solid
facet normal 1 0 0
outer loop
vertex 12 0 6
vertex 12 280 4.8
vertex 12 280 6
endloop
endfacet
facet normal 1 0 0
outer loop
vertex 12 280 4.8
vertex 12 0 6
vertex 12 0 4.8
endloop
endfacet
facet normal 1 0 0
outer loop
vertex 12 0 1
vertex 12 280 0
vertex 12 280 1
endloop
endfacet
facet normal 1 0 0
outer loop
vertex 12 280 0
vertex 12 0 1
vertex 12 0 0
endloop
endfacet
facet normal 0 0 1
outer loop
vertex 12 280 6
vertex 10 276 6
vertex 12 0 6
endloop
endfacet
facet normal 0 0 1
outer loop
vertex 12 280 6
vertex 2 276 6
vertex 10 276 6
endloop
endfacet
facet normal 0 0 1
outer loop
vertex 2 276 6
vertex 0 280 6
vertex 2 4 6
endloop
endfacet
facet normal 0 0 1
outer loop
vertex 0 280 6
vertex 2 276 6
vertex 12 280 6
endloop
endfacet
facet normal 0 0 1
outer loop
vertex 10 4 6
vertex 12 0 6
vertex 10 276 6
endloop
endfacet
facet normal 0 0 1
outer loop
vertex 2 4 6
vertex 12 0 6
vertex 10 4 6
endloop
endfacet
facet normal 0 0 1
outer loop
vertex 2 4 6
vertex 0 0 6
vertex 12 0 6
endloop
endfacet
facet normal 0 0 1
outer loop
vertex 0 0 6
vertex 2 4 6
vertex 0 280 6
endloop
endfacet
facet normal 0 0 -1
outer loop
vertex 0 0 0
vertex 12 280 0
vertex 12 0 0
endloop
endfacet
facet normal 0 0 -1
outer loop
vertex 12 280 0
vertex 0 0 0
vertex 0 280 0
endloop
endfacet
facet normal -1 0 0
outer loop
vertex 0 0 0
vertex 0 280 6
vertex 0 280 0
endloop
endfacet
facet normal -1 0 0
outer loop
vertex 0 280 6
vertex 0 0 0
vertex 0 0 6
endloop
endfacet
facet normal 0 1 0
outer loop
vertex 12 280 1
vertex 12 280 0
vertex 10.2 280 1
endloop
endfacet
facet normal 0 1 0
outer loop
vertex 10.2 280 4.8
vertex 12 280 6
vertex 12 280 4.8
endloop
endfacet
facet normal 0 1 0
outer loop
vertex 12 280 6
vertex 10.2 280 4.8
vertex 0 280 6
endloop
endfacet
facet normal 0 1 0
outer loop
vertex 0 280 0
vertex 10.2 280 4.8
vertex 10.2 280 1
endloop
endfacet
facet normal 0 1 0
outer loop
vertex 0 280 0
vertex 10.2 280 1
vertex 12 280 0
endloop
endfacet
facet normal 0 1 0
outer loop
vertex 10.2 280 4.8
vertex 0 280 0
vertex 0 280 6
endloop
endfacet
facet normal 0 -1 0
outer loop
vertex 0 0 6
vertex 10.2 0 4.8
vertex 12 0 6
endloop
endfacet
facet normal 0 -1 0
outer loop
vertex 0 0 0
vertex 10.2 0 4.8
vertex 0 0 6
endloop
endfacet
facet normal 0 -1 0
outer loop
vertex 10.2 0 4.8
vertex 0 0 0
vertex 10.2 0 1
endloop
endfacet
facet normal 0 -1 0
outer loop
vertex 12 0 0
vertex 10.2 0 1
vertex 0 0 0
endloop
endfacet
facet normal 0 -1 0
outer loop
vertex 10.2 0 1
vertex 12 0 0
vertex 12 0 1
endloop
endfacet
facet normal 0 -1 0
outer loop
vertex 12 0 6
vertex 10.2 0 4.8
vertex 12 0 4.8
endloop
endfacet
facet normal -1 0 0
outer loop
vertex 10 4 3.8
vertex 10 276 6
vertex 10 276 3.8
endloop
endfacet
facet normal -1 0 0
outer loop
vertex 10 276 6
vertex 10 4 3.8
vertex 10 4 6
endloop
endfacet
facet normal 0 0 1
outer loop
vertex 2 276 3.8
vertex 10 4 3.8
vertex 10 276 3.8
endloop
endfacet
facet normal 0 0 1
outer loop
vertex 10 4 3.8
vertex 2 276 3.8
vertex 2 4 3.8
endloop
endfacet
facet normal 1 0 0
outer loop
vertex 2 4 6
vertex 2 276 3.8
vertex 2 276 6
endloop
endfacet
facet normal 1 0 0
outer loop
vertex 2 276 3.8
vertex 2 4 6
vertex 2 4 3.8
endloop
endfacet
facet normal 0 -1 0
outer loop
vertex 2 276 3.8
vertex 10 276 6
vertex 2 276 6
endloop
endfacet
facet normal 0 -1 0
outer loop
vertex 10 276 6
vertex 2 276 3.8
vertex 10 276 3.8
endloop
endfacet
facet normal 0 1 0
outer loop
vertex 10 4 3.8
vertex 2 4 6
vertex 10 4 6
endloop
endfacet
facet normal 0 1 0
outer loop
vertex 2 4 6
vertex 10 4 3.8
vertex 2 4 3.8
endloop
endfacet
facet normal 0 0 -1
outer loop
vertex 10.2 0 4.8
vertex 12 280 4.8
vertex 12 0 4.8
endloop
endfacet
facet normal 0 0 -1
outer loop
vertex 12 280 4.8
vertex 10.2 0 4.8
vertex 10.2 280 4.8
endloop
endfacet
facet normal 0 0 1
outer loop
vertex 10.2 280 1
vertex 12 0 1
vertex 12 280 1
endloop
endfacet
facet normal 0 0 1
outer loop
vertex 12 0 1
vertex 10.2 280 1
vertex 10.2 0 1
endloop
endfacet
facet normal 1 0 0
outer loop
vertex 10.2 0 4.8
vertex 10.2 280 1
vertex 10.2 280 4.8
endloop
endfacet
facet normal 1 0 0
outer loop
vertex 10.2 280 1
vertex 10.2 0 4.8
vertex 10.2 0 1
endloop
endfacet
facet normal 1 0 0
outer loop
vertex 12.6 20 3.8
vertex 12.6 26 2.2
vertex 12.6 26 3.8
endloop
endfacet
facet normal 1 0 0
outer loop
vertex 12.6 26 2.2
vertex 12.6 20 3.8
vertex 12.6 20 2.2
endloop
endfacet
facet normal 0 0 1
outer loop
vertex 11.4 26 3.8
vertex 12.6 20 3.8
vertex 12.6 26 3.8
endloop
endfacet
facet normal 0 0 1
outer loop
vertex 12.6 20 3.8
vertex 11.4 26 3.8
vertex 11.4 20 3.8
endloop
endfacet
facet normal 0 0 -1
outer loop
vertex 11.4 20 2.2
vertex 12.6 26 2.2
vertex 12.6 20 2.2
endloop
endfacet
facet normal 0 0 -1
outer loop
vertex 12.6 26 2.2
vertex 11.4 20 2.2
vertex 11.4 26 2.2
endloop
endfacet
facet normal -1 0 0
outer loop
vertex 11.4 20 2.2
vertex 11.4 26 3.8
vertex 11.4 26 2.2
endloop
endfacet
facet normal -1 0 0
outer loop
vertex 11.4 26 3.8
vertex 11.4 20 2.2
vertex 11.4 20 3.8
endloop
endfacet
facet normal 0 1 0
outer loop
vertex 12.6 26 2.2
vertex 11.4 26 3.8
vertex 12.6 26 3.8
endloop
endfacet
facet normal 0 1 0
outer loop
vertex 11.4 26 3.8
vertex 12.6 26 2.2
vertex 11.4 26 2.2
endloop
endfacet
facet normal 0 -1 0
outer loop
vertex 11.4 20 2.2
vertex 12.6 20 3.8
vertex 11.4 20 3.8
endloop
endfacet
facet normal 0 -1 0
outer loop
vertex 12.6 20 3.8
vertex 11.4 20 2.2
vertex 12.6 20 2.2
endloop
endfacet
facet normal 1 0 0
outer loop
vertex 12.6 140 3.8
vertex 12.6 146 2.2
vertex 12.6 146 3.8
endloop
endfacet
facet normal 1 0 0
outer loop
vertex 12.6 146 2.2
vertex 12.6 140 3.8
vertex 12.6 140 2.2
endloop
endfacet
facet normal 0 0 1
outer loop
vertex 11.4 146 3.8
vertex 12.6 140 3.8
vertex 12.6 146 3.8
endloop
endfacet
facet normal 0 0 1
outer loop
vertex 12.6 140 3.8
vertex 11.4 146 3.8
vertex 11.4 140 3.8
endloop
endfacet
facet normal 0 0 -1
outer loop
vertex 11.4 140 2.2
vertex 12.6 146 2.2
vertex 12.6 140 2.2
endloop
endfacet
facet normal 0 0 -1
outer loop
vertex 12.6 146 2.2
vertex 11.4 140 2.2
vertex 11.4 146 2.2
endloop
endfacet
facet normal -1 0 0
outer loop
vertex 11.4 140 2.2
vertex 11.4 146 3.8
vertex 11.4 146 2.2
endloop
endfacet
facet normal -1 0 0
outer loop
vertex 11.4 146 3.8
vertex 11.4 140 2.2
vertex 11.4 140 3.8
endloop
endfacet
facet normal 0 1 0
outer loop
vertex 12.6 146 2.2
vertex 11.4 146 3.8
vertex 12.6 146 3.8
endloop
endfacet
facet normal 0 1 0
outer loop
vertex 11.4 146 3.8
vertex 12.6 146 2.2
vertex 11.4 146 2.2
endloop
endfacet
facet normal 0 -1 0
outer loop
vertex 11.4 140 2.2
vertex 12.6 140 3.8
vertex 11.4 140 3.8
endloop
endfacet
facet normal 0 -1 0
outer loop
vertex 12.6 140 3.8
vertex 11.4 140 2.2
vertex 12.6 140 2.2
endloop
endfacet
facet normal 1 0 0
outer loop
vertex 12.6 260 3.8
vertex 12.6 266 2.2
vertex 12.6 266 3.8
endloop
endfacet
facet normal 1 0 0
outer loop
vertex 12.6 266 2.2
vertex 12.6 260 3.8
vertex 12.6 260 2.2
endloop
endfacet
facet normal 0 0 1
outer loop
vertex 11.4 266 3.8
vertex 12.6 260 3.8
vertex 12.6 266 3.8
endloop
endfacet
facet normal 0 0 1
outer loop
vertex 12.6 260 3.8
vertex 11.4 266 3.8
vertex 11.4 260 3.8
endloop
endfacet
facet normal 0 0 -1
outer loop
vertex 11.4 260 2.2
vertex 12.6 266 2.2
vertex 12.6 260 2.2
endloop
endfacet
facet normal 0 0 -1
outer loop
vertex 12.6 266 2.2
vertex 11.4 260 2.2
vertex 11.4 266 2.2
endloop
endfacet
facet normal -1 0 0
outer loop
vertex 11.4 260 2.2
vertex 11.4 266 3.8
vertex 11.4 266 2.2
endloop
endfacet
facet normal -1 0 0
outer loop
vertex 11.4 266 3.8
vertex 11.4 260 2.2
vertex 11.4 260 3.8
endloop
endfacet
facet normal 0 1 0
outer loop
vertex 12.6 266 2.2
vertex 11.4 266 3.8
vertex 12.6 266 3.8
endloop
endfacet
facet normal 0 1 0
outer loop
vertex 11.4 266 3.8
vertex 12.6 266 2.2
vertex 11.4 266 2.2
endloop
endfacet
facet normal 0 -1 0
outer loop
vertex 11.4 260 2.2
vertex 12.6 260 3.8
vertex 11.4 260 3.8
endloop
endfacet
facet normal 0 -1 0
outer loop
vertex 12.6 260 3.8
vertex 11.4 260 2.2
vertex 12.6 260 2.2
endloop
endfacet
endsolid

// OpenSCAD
// Clip-on trit / gamma-drift band. Slides into deck_shell left slot.
// Print standing on the 6 mm face. Channel is a diffuser, not an MCU.
$fn=24;
L=104+158.4+137+12; // ~411 along shell height stack, trim to fit
L=280;
thk=6; w=12; slot=2; lip=1.6;
difference(){
  cube([w,L,thk]);
  // gamma channel (LED strip or printed trit ticket)
  translate([2,4,thk-2.2]) cube([w-4, L-8, 2.4]);
  // snap tongue → shell 2.2 mm slot
  translate([w-1.8,-0.1,1]) cube([2, L+0.2, 3.8]);
}
// three detent nubs
for(y=[20, L/2, L-20])
  translate([w-0.6,y,2.2]) cube([1.2,6,1.6]);
